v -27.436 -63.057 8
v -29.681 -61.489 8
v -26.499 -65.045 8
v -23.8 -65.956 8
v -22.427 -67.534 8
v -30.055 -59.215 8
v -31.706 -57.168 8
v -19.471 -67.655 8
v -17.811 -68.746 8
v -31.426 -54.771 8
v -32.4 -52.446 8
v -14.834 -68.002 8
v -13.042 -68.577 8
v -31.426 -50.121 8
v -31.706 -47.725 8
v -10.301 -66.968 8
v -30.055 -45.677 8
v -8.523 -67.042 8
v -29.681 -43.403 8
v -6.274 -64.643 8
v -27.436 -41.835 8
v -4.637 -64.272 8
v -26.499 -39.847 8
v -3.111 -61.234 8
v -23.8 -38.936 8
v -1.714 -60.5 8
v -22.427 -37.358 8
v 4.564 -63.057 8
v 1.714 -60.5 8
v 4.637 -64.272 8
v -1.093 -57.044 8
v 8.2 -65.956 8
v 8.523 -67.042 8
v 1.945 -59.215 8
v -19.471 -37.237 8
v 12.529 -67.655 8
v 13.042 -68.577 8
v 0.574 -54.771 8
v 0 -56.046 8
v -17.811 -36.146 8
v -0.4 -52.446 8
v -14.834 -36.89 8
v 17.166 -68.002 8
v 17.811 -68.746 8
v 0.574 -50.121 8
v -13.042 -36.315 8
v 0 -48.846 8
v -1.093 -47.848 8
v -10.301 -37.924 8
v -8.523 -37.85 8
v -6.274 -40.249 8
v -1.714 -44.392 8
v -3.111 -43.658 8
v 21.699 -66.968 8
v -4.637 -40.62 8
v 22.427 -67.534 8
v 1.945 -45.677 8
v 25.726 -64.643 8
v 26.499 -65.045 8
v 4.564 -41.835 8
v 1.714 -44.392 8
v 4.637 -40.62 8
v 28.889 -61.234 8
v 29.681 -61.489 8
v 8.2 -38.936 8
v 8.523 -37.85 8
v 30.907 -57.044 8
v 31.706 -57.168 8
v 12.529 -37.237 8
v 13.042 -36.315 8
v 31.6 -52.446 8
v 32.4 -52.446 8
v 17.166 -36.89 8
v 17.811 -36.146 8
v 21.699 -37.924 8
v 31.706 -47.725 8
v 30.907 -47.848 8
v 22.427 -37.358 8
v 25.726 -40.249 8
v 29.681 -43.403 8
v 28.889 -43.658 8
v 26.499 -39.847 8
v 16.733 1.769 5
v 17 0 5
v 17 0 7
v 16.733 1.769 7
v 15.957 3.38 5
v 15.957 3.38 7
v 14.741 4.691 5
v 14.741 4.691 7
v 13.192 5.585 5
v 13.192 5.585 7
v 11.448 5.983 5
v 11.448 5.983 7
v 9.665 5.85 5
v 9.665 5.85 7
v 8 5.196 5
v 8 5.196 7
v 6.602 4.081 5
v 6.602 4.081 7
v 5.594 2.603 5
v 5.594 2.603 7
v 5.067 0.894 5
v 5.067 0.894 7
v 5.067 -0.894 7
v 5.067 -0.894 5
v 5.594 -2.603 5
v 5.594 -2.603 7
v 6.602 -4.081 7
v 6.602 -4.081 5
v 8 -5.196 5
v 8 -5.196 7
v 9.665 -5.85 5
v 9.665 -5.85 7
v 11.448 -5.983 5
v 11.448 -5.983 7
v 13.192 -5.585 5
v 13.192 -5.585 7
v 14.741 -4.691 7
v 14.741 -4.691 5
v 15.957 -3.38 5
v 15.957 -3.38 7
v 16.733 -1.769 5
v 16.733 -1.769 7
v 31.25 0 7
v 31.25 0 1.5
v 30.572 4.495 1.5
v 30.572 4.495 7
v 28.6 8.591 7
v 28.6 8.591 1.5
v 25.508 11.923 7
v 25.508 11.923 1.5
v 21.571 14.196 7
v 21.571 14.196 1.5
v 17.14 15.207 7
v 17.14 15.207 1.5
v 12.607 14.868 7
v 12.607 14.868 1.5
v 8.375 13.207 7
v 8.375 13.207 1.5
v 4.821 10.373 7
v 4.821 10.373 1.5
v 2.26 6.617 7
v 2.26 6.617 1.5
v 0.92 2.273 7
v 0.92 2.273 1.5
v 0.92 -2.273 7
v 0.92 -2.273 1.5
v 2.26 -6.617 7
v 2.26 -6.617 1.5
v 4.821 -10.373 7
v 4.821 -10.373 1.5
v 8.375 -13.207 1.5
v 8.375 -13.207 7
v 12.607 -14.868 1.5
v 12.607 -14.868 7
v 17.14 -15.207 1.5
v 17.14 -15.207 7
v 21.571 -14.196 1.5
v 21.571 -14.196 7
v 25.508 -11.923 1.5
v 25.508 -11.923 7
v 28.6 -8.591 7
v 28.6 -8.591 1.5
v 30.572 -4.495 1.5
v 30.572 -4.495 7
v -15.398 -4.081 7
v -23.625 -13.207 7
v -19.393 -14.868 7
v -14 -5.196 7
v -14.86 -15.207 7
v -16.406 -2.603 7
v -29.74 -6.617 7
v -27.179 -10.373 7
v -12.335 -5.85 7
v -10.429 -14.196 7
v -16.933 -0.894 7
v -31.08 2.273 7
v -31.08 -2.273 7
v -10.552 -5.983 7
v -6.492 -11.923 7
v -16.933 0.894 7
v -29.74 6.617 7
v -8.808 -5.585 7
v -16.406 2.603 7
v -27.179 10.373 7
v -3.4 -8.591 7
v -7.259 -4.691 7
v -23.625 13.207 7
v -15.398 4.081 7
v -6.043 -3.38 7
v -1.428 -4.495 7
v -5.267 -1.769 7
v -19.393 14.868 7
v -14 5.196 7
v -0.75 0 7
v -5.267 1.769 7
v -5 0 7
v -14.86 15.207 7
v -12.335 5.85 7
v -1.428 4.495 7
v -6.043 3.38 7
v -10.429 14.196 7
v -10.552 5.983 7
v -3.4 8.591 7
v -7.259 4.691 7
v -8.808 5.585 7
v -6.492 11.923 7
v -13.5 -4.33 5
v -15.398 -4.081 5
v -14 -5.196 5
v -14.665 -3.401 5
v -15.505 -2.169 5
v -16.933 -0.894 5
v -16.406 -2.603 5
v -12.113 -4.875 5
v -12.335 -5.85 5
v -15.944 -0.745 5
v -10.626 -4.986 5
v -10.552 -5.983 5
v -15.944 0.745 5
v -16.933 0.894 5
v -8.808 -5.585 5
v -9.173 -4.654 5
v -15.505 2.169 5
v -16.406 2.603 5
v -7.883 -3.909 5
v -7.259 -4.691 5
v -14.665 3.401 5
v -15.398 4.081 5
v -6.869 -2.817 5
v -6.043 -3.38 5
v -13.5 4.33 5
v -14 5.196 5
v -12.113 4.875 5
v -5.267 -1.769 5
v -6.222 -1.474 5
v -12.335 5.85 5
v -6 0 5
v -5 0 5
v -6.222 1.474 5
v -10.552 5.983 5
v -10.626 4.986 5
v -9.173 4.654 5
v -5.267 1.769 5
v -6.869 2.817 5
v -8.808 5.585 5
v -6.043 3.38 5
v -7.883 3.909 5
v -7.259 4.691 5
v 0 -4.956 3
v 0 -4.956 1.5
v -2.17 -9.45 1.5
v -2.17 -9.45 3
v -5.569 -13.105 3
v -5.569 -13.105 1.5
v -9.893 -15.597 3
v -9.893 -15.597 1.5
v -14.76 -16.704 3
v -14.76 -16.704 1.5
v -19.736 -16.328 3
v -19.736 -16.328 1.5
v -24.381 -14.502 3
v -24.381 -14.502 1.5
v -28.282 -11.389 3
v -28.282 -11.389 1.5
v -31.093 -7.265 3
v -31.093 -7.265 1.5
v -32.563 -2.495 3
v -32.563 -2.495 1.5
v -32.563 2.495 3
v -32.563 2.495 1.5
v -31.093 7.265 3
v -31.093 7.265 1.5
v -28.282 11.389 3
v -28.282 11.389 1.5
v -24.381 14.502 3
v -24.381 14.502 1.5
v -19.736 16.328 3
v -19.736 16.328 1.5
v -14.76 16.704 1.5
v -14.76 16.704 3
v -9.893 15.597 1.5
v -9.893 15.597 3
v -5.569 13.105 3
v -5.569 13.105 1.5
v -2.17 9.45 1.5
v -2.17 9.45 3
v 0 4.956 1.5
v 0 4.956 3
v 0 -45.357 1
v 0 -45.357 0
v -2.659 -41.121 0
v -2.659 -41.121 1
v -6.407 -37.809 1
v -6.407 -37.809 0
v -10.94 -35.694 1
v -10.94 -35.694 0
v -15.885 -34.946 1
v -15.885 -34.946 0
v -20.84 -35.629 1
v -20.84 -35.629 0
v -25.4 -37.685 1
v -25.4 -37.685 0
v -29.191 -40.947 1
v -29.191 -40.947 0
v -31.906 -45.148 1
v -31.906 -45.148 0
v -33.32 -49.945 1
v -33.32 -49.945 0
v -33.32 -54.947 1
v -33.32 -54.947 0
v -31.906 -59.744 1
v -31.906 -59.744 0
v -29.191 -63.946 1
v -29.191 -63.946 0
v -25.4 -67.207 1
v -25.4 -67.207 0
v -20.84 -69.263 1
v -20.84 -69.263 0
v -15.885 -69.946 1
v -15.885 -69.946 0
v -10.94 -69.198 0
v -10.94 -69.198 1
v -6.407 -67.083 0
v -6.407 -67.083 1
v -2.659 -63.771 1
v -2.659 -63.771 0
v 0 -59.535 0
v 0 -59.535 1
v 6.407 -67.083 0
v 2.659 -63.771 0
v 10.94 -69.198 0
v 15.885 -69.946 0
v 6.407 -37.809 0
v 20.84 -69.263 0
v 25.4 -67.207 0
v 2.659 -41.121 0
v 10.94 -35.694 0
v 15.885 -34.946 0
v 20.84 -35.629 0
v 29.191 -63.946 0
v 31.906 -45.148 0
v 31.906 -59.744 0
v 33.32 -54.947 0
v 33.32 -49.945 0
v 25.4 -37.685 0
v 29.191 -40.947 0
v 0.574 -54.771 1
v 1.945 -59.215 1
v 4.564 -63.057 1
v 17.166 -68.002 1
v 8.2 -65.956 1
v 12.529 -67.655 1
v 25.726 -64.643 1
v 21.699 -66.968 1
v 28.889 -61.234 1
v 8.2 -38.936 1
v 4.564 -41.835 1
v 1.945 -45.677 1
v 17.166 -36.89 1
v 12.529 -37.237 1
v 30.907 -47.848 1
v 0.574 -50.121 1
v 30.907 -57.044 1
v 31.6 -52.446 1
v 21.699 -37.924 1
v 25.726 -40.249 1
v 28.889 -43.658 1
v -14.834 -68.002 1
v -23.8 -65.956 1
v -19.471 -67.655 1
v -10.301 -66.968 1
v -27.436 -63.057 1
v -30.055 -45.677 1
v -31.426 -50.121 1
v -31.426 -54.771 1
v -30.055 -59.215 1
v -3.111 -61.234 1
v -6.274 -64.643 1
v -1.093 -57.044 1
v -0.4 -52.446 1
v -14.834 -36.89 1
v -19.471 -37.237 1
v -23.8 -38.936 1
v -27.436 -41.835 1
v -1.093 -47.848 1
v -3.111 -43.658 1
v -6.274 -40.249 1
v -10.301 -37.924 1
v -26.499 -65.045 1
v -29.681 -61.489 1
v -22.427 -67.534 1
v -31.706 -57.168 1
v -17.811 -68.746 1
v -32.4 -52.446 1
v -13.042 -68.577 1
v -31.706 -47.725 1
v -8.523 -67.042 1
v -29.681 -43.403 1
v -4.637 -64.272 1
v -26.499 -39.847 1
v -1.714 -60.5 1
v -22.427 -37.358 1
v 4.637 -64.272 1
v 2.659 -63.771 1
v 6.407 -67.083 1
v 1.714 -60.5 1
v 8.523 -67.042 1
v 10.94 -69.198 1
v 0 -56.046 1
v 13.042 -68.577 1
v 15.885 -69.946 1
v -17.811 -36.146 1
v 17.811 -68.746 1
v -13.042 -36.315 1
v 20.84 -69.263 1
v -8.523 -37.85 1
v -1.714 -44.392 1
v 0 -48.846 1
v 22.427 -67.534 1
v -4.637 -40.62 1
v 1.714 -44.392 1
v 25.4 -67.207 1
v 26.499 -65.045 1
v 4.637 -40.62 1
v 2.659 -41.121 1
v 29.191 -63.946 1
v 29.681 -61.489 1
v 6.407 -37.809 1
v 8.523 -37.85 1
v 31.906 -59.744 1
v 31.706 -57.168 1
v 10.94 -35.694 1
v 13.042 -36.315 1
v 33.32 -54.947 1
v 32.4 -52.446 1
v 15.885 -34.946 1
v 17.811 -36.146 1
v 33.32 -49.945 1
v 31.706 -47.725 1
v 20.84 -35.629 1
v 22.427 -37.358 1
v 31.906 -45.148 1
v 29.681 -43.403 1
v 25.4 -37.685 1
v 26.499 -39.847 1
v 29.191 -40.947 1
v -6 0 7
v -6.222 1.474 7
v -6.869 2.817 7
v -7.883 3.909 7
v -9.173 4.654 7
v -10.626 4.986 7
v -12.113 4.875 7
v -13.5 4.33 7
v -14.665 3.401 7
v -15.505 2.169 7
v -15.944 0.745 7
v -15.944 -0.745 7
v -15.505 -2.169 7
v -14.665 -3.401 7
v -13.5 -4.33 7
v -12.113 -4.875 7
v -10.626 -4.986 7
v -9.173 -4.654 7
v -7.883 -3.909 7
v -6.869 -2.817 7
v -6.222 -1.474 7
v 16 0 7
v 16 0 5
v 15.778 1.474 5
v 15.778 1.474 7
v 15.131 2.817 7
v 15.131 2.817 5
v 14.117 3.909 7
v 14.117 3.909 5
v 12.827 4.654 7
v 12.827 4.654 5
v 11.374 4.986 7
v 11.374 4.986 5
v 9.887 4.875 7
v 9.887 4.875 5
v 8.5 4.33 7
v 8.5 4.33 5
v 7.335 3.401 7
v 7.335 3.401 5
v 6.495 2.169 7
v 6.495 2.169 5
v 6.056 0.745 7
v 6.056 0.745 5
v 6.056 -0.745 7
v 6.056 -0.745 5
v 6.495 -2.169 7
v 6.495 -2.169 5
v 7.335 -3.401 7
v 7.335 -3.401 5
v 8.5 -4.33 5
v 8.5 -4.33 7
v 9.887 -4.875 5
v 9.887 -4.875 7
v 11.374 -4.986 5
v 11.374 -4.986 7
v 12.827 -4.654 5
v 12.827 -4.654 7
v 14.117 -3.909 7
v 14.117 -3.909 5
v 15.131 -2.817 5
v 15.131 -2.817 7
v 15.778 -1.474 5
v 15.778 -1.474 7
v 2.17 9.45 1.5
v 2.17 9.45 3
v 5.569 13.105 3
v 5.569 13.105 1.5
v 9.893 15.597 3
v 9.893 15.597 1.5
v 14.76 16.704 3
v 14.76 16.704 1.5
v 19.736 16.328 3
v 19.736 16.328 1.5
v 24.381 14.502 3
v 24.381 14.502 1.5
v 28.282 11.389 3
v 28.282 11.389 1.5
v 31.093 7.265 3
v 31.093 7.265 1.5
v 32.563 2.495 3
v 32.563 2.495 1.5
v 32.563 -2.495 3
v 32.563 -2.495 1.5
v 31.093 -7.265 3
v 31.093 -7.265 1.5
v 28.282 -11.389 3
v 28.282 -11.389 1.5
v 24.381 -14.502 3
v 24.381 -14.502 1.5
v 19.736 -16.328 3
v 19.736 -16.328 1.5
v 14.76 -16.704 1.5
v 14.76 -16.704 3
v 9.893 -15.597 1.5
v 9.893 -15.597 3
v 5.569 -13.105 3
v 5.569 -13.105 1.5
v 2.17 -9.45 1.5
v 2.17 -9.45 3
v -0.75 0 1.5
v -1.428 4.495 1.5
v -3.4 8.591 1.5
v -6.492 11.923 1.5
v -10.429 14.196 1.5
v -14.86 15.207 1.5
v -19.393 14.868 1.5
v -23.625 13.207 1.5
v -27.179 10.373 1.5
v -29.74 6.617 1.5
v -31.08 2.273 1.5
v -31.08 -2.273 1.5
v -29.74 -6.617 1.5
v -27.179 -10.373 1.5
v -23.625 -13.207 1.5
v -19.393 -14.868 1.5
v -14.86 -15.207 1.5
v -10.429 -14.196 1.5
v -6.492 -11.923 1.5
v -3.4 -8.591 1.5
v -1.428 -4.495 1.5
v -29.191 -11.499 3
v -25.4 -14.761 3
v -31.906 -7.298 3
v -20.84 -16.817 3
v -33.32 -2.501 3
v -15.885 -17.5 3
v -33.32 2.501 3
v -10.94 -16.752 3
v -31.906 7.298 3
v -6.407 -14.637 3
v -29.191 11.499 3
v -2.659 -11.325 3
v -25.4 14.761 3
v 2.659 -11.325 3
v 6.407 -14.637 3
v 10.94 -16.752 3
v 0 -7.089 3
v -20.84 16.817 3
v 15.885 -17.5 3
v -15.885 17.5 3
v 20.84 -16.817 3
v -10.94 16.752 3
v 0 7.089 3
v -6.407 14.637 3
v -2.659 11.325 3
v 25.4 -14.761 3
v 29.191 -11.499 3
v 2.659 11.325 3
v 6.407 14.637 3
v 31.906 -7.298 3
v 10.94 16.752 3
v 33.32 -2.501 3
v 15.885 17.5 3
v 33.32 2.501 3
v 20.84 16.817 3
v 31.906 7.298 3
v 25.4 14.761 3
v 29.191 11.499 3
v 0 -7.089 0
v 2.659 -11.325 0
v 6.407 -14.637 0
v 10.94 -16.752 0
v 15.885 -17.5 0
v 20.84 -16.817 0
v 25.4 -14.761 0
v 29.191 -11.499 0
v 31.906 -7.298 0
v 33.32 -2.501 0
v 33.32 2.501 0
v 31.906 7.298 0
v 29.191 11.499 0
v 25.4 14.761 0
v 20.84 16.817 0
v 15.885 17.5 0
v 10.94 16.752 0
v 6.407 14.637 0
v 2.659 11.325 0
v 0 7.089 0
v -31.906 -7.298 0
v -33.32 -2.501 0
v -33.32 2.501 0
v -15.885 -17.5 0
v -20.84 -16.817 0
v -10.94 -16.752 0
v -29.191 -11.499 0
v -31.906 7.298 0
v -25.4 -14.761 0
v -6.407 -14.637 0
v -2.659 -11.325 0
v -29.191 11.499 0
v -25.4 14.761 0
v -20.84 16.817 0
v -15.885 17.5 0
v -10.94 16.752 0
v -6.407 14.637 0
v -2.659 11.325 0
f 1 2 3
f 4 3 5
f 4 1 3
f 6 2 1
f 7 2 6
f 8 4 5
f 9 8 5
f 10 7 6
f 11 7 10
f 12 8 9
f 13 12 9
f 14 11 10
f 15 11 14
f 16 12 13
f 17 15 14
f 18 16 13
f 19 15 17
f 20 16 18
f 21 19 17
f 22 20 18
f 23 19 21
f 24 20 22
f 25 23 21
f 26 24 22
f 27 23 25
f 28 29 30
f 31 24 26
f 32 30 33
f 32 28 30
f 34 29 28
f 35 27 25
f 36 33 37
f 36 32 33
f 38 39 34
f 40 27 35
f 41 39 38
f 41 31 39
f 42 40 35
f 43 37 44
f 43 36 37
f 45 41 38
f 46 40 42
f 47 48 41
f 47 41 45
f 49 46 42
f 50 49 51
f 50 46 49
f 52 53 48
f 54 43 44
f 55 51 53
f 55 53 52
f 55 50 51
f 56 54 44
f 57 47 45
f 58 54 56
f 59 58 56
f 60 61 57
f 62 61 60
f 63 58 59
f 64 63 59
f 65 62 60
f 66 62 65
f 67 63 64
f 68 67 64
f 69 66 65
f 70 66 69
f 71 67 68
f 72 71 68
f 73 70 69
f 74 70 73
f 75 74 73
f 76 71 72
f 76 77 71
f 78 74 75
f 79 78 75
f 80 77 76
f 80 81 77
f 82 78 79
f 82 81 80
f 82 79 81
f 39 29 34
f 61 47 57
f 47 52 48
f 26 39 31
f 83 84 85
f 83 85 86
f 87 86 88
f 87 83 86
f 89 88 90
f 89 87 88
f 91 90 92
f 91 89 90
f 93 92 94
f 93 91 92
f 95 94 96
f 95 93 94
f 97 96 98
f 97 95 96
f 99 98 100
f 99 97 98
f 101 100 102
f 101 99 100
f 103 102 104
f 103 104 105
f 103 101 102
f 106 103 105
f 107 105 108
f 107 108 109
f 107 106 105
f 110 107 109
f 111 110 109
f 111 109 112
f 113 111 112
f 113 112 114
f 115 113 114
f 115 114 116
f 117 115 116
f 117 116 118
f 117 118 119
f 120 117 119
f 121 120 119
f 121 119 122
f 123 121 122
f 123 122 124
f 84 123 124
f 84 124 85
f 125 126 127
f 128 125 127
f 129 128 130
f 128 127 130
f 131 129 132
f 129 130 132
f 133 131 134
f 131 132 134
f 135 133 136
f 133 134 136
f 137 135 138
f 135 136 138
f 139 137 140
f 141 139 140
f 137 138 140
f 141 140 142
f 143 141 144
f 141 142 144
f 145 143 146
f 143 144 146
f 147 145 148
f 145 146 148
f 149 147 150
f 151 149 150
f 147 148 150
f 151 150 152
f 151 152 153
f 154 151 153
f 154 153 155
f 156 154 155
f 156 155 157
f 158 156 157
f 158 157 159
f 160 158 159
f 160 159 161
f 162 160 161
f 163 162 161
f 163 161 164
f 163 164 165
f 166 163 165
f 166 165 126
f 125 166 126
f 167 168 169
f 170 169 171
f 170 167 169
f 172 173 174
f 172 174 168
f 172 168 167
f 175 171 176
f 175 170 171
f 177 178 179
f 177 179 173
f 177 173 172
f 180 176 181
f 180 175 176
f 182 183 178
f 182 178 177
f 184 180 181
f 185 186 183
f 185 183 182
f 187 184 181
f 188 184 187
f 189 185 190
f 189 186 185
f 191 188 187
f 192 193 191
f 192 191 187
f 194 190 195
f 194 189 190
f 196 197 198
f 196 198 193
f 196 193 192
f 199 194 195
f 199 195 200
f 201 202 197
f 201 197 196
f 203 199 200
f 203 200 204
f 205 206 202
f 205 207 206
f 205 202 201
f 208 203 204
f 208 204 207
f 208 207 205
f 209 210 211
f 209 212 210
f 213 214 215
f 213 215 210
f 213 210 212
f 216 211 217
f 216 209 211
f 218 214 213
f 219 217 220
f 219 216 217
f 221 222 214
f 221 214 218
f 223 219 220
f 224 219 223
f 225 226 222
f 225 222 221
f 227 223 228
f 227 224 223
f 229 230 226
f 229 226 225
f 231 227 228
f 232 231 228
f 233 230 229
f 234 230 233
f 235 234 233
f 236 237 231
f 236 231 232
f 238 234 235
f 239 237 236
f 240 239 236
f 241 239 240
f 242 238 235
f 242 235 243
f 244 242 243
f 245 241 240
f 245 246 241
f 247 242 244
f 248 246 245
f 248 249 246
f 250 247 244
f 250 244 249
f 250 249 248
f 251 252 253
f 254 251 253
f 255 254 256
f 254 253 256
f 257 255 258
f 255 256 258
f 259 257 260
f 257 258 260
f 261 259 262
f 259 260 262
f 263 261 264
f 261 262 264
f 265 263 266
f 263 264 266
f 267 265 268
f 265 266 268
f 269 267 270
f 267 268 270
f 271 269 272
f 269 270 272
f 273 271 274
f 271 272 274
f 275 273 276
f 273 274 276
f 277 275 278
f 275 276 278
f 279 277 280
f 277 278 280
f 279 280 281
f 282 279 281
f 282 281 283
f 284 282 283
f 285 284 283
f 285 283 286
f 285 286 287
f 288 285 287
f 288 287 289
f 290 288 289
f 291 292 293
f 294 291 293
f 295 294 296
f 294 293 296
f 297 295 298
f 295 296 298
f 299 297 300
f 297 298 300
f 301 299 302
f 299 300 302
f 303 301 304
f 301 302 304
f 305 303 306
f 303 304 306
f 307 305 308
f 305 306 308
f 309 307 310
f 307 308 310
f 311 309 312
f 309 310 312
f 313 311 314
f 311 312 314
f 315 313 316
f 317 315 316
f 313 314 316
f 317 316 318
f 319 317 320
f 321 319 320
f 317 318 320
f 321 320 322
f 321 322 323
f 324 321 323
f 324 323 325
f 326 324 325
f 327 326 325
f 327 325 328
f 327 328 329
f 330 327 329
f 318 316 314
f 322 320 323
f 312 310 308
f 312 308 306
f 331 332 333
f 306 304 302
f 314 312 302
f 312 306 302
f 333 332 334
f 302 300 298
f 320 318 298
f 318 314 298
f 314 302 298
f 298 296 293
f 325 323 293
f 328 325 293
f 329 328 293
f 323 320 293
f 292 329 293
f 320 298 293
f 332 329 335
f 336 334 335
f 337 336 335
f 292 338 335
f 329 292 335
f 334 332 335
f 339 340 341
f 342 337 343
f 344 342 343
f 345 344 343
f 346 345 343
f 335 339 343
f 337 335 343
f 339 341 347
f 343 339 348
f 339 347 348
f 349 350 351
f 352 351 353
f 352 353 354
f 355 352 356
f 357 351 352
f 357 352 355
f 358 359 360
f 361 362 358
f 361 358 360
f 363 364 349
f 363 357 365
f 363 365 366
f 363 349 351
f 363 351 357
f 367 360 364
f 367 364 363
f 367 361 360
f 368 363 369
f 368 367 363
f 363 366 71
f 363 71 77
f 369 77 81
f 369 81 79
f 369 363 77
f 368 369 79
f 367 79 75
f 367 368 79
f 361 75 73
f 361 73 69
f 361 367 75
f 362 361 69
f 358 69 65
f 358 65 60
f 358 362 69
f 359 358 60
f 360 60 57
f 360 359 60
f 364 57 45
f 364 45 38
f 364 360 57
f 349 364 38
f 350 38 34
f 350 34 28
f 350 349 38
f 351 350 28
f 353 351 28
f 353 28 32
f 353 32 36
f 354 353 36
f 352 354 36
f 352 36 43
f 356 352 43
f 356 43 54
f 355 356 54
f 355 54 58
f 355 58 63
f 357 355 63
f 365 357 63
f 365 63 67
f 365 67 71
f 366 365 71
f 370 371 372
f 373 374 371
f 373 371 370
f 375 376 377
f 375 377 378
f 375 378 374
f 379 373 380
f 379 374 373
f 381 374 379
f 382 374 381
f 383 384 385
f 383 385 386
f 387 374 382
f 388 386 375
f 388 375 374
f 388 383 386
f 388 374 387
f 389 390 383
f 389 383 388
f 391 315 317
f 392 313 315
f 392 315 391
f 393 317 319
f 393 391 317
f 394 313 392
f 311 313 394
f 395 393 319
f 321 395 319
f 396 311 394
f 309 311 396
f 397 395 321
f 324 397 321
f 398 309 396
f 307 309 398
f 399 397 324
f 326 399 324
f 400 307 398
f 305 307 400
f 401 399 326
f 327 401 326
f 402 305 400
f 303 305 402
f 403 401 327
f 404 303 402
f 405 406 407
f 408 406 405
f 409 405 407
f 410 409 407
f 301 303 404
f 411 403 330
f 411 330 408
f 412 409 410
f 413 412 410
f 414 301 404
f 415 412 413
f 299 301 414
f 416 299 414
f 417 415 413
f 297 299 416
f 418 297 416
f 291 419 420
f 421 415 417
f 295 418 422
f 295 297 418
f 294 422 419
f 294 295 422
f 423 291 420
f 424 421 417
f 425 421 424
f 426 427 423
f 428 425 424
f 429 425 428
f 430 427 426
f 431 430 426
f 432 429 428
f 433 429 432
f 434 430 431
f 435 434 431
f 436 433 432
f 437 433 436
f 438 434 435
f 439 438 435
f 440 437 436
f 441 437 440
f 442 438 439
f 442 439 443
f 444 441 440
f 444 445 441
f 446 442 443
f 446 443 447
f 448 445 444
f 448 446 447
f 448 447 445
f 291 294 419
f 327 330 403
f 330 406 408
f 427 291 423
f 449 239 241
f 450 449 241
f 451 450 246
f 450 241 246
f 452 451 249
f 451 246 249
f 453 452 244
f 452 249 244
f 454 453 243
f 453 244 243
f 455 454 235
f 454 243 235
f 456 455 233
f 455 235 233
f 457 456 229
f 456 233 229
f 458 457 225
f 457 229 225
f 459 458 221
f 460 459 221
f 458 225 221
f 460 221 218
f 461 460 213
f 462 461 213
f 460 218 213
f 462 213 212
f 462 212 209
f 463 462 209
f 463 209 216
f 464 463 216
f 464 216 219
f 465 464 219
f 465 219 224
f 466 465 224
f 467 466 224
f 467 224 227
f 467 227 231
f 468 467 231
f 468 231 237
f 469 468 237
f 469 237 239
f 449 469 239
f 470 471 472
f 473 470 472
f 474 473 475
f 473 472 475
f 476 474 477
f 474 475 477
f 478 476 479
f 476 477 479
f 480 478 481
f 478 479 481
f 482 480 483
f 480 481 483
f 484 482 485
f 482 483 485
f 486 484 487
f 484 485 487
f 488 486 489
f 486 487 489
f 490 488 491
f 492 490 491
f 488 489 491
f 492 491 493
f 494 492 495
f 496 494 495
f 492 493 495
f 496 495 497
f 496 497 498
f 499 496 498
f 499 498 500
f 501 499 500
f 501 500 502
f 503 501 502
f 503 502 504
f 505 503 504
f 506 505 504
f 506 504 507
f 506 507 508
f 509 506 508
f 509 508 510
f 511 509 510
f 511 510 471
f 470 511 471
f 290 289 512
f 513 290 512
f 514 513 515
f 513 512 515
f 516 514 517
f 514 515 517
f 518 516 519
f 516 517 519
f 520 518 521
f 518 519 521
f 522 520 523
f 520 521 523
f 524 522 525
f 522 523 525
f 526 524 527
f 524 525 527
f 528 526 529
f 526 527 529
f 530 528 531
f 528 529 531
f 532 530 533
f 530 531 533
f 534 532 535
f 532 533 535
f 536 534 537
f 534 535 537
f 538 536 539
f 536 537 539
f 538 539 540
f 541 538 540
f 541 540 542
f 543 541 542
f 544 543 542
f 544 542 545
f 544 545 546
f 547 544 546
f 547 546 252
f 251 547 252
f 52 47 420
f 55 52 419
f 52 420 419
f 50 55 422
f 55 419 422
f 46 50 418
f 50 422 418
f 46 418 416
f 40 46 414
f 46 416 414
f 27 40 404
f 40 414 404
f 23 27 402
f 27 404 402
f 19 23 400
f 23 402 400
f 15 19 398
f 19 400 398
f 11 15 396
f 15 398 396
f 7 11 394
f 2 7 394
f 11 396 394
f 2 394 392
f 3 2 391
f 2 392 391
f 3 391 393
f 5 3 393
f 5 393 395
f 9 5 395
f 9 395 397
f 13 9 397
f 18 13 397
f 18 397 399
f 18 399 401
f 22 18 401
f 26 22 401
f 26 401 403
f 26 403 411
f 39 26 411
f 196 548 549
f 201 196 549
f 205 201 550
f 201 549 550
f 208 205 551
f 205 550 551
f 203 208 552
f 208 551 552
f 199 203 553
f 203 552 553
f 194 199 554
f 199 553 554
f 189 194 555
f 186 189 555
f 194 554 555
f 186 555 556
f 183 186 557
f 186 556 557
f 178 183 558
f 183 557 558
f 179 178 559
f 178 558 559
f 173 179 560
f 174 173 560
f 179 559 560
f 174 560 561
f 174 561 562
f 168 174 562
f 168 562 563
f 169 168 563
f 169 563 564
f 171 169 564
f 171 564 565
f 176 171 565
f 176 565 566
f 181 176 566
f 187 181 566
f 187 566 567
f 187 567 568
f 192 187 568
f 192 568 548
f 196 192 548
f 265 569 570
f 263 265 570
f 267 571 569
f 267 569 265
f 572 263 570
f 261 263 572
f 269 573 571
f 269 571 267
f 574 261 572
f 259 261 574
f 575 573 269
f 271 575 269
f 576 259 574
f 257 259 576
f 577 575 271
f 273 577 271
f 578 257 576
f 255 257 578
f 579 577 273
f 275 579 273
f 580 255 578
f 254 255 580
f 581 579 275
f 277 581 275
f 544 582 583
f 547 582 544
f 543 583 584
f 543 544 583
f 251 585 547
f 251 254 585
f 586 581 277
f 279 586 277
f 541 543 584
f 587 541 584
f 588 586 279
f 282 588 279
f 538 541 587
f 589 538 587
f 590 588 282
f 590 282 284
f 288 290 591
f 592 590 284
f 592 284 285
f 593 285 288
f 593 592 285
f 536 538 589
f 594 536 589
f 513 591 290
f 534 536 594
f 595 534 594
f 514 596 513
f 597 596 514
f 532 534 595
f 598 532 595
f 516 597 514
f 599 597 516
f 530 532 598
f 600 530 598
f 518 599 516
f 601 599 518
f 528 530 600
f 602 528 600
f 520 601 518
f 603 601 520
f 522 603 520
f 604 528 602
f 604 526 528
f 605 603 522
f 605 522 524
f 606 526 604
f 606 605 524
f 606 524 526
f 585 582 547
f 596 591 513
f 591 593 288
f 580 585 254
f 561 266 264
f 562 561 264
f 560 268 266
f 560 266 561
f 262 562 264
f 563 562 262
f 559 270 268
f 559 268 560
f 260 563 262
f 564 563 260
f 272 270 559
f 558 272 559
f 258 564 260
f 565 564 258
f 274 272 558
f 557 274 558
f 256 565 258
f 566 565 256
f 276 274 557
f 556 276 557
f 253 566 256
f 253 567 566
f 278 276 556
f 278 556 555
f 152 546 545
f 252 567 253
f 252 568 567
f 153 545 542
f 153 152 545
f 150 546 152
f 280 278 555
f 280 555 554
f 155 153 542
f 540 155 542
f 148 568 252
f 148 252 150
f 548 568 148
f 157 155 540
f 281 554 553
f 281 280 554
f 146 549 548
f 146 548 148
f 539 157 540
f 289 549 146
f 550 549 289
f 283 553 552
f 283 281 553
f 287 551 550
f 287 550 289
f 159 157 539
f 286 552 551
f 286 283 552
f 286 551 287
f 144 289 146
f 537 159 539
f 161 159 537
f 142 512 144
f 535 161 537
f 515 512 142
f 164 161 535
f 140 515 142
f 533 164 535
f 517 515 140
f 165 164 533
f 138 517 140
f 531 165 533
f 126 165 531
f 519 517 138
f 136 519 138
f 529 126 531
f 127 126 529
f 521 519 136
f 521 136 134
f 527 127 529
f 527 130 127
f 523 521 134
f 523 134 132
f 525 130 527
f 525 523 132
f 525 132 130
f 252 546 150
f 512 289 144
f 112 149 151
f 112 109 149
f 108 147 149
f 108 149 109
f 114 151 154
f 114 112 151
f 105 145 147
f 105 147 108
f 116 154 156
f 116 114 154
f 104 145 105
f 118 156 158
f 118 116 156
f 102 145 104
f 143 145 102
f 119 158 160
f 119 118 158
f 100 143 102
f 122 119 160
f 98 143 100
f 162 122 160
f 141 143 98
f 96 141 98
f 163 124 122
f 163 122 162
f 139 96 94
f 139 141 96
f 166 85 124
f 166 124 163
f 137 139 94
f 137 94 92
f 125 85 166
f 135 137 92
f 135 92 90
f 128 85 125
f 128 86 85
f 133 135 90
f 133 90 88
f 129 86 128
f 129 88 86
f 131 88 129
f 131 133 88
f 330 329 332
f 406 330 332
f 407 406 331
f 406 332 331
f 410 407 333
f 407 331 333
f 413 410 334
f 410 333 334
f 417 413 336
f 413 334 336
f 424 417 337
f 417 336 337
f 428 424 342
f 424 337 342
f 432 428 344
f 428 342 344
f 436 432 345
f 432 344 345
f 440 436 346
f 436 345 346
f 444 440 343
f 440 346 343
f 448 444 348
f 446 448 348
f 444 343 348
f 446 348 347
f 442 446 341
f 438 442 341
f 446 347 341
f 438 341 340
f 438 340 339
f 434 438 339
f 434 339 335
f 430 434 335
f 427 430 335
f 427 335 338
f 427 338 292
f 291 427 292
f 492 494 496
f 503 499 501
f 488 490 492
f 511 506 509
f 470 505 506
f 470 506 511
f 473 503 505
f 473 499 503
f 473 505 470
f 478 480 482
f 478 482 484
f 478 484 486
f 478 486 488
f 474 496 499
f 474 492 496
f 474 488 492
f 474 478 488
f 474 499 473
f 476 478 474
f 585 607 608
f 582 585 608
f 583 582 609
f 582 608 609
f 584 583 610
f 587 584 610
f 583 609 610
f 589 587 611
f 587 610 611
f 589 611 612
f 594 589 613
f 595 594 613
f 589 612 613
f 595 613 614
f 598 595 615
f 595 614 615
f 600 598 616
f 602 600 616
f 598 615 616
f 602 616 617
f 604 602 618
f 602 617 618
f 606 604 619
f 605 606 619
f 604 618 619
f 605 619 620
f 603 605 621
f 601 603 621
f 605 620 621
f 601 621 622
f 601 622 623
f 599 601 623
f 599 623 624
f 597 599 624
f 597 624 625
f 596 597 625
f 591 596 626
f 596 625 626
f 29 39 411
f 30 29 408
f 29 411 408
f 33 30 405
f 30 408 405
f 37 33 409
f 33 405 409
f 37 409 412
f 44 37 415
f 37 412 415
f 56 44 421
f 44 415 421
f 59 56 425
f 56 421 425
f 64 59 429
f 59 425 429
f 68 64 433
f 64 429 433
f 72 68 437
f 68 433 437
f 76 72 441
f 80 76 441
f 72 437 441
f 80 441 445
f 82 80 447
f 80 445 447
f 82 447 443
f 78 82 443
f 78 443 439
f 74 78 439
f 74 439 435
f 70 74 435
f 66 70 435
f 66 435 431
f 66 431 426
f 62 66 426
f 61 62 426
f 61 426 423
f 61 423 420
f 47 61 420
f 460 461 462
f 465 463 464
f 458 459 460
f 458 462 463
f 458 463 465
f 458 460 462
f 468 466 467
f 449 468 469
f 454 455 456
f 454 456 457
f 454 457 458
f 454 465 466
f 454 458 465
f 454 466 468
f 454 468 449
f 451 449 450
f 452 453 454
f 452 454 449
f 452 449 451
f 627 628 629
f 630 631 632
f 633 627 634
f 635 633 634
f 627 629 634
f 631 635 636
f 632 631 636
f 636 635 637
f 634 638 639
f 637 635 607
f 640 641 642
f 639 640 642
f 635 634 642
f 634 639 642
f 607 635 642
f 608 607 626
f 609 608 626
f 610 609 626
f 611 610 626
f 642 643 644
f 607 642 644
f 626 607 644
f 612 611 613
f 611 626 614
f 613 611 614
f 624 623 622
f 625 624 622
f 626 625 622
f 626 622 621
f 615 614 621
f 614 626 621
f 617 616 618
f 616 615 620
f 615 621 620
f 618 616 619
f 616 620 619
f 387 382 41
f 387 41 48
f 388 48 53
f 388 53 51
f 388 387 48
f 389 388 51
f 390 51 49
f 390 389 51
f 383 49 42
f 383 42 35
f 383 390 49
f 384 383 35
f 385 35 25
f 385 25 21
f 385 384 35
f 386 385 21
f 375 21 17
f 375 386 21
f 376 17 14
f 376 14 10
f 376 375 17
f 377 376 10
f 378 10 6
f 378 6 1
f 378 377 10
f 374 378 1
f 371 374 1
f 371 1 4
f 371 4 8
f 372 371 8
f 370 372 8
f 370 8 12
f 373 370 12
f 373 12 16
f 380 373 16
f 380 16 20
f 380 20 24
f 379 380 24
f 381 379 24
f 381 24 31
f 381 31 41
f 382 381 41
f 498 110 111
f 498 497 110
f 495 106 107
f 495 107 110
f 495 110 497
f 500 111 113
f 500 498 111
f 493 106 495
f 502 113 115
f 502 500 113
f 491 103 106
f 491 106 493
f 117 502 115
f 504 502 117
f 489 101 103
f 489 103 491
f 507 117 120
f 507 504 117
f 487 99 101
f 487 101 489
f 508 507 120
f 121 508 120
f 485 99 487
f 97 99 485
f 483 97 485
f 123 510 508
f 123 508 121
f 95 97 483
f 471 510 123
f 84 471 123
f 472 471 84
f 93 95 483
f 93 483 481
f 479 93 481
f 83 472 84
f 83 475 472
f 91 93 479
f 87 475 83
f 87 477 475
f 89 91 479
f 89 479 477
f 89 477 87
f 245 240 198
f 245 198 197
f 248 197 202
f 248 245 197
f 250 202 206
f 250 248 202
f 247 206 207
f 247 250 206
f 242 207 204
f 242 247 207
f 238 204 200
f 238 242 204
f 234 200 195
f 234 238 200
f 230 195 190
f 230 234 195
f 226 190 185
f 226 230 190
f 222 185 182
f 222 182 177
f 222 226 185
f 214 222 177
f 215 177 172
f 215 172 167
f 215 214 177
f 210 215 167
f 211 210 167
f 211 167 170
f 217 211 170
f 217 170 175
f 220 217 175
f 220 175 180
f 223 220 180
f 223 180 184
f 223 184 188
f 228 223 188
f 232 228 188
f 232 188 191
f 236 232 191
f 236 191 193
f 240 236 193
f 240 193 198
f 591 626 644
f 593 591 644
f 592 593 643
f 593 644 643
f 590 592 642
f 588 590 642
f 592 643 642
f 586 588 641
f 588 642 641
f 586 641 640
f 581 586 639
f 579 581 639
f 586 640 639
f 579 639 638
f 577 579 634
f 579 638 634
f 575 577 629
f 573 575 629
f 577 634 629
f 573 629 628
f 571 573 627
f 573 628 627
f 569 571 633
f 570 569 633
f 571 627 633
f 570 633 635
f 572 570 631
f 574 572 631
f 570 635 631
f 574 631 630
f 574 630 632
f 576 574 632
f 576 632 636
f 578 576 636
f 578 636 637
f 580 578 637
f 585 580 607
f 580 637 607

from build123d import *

# Parameters (mm, degrees)
F0_R     = 5
F1_DEPTH = 7
F0_R_2   = 15.25
F0_R_3   = 6
F2_DEPTH = 5
F3_DEPTH = 1.5
F4_DEPTH = 3
F0_R_4   = 15.6
F5_DEPTH = 8
F6_DEPTH = 1


with BuildPart() as f1:
    # F0 (on Top) → F1 (new body)
    with BuildSketch(Plane.XY):
        with Locations((-11, 0)):
            Circle(F0_R)
    extrude(amount=F1_DEPTH)



with BuildPart() as f1b:
    # F0 (on Top) → F1, piece 2 (new body)
    with BuildSketch(Plane.XY):
        with Locations((11, 0)):
            Circle(F0_R)
    extrude(amount=F1_DEPTH)



with BuildPart() as f1c:
    # F0 (on Top) → F1, piece 3 (new body)
    with BuildSketch(Plane.XY):
        with Locations((-16, 0)):
            Circle(F0_R_2)
        with Locations((-11, 0)):
            Circle(F0_R_3, mode=Mode.SUBTRACT)
    extrude(amount=F1_DEPTH)


with BuildPart() as f1d:
    # F0 (on Top) → F1, piece 4 (new body)
    with BuildSketch(Plane.XY):
        with Locations((16, 0)):
            Circle(F0_R_2)
        with Locations((11, 0)):
            Circle(F0_R_3, mode=Mode.SUBTRACT)
    extrude(amount=F1_DEPTH)


with BuildPart() as f1_1:
    add(f1.part)

    add(f1c.part)  # F2 merges F1c
    # F0 (on Top) → F2 (join)
    with BuildSketch(Plane.XY):
        with Locations((-11, 0)):
            Circle(F0_R_3)
        with Locations((-11, 0)):
            Circle(F0_R, mode=Mode.SUBTRACT)
    extrude(amount=F2_DEPTH)



with BuildPart() as f1b_1:
    add(f1b.part)

    add(f1d.part)  # F2#2 merges F1d
    # F0 (on Top) → F2, piece 2 (join)
    with BuildSketch(Plane.XY):
        with Locations((11, 0)):
            Circle(F0_R_3)
        with Locations((11, 0)):
            Circle(F0_R, mode=Mode.SUBTRACT)
    extrude(amount=F2_DEPTH)


with BuildPart() as f1_2:
    add(f1_1.part)

    add(f1b_1.part)  # F3 merges F1b
    # F0 (on Top) → F3 (join)
    with BuildSketch(Plane.XY):
        with BuildLine():
            ThreePointArc((0, -4.9560569004), (32.75, 0), (0, 4.9560569004))
            ThreePointArc((0, 4.9560569004), (-32.75, 0), (0, -4.9560569004))
        make_face()
        with Locations((-16, 0)):
            Circle(F0_R_2, mode=Mode.SUBTRACT)
        with Locations((16, 0)):
            Circle(F0_R_2, mode=Mode.SUBTRACT)
    extrude(amount=F3_DEPTH)

    # F0 (on Top) → F4 (join)
    with BuildSketch(Plane.XY):
        with BuildLine():
            ThreePointArc((0, -7.0887234394), (33.5, 0), (0, 7.0887234394))
            ThreePointArc((0, 7.0887234394), (-33.5, 0), (0, -7.0887234394))
        make_face()
        with BuildLine():
            ThreePointArc((0, -4.9560569004), (-32.75, 0), (0, 4.9560569004))
            ThreePointArc((0, 4.9560569004), (32.75, 0), (0, -4.9560569004))
        make_face(mode=Mode.SUBTRACT)
    extrude(amount=F4_DEPTH)


with BuildPart() as f5:
    # F0 (on Top) → F5 (new body)
    with BuildSketch(Plane.XY):
        with BuildLine():
            ThreePointArc((0, -56.0460449815), (32.4, -52.4460449815), (0, -48.8460449815))
            ThreePointArc((0, -48.8460449815), (-32.4, -52.4460449815), (0, -56.0460449815))
        make_face()
        with Locations((-16, -52.4460449815)):
            Circle(F0_R_4, mode=Mode.SUBTRACT)
        with Locations((16, -52.4460449815)):
            Circle(F0_R_4, mode=Mode.SUBTRACT)
    extrude(amount=F5_DEPTH)

    # F0 (on Top) → F6 (join)
    with BuildSketch(Plane.XY):
        with BuildLine():
            ThreePointArc((0, -45.3573215421), (-33.5, -52.4460449815), (0, -59.5347684209))
            ThreePointArc((0, -59.5347684209), (33.5, -52.4460449815), (0, -45.3573215421))
        make_face()
        with BuildLine():
            ThreePointArc((0, -56.0460449815), (-32.4, -52.4460449815), (0, -48.8460449815))
            ThreePointArc((0, -48.8460449815), (32.4, -52.4460449815), (0, -56.0460449815))
        make_face(mode=Mode.SUBTRACT)
        with Locations((-16, -52.4460449815)):
            Circle(F0_R_4)
        with Locations((16, -52.4460449815)):
            Circle(F0_R_4)
    extrude(amount=F6_DEPTH)


solid = Compound([f1_2.part, f5.part])
